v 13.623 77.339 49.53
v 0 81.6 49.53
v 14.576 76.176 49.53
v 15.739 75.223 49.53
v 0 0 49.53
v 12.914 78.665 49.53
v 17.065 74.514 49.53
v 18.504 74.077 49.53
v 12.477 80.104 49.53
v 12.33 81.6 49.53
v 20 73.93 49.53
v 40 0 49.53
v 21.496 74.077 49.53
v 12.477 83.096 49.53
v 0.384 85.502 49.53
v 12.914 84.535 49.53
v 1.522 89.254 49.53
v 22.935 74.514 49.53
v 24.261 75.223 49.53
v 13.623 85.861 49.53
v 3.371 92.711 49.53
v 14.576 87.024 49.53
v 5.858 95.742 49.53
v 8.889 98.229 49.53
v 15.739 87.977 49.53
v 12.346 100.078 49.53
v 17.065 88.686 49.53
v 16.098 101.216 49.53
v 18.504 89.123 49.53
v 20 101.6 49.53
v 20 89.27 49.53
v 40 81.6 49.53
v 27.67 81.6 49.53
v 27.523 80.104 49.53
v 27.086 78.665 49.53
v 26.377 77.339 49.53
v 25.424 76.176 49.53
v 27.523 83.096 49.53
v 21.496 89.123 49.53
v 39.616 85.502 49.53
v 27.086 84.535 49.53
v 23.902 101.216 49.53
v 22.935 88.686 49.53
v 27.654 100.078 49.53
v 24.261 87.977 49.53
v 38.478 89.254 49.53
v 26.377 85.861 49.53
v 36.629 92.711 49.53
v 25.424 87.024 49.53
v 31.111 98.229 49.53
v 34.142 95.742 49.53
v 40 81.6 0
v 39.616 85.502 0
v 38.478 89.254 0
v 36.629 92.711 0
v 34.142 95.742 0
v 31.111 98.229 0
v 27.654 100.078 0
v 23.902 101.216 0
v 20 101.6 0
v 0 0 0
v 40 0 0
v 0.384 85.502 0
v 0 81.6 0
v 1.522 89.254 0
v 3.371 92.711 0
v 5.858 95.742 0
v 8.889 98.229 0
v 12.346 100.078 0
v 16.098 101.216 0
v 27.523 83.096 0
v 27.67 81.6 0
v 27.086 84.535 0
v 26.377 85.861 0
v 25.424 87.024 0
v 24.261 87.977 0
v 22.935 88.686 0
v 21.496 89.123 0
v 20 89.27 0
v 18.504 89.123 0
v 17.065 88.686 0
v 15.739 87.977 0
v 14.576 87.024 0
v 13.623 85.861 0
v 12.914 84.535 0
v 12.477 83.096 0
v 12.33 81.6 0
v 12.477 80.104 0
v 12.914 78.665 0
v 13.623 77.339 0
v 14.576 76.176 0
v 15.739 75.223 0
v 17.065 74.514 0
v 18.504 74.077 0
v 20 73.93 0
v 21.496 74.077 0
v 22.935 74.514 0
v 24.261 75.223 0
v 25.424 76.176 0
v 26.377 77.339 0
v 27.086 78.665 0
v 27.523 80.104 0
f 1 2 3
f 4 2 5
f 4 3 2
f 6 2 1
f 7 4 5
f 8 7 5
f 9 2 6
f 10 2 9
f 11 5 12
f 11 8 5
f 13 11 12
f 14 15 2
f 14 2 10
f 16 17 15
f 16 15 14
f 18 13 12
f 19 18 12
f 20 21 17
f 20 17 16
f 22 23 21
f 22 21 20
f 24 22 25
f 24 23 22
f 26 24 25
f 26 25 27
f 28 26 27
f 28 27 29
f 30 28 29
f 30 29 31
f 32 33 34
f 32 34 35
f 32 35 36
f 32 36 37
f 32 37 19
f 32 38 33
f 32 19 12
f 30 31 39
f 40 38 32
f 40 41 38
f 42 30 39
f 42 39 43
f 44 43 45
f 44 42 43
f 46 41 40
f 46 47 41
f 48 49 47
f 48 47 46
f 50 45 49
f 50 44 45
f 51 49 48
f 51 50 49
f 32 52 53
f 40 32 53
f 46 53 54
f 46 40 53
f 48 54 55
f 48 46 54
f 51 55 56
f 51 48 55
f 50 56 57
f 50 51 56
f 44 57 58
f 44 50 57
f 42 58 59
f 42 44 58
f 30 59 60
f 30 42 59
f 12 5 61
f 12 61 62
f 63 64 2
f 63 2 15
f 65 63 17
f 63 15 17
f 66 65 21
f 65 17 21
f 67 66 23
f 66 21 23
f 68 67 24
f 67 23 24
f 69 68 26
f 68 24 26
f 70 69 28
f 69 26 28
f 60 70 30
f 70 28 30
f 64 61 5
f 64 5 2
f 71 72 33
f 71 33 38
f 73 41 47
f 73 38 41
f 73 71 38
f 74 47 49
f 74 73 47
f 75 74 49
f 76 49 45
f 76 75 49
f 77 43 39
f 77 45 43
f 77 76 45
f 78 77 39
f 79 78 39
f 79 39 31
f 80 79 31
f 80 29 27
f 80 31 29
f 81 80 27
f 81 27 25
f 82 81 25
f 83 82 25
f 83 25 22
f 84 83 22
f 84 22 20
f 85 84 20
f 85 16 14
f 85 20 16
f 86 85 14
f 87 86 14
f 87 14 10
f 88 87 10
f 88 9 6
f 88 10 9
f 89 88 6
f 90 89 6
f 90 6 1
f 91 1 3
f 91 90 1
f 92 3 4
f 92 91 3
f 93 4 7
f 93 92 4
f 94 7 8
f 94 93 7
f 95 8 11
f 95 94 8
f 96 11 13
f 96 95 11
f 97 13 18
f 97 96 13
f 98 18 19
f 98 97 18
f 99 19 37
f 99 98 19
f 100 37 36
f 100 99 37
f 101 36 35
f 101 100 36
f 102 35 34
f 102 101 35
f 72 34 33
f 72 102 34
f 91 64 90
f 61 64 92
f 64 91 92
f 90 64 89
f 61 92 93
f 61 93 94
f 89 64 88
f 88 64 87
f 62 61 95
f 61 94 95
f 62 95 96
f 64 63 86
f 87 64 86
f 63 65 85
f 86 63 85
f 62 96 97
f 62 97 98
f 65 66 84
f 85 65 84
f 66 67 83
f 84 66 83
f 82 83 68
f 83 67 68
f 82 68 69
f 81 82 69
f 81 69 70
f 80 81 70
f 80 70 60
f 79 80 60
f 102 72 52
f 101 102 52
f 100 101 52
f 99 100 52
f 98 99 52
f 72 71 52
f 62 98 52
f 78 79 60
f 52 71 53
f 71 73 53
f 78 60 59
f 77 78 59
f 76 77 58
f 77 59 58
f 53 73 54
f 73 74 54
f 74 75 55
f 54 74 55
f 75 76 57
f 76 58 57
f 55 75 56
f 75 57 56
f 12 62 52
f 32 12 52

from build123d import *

# Parameters (mm, degrees)
SKETCH1_W               = 40
SKETCH1_H               = 101.6
BOSS_EXTRUDE1_DEPTH     = 49.53
FILLET1_R               = 20
CUT_EXTRUDE2_DEPTH      = 120.899044617
CUT_EXTRUDE2_DEPTH_BACK = 120.899044617
SKETCH2_R               = 7.67


with BuildPart() as part:
    # Sketch1 → Boss-Extrude1 (new body)
    with BuildSketch(Plane.XY):
        with Locations((20, 50.8)):
            Rectangle(SKETCH1_W, SKETCH1_H)
    extrude(amount=BOSS_EXTRUDE1_DEPTH)

    # Fillet1
    fillet1_edges = [part.edges().sort_by_distance(p)[0] for p in [
        (40, 101.6, 24.765),
        (0, 101.6, 24.765),
    ]]
    fillet(fillet1_edges, radius=FILLET1_R - 0.0001)  # a hair under: the kernel refuses the full size

    # Sketch2 → Cut-Extrude2 (cut, two sides: drawn at the far end of the back side and taken through both)
    with BuildSketch(Plane.XY.offset(-CUT_EXTRUDE2_DEPTH_BACK)):
        with Locations((20, 81.6)):
            Circle(SKETCH2_R)
    extrude(amount=CUT_EXTRUDE2_DEPTH + CUT_EXTRUDE2_DEPTH_BACK, mode=Mode.SUBTRACT)


solid = part.part
